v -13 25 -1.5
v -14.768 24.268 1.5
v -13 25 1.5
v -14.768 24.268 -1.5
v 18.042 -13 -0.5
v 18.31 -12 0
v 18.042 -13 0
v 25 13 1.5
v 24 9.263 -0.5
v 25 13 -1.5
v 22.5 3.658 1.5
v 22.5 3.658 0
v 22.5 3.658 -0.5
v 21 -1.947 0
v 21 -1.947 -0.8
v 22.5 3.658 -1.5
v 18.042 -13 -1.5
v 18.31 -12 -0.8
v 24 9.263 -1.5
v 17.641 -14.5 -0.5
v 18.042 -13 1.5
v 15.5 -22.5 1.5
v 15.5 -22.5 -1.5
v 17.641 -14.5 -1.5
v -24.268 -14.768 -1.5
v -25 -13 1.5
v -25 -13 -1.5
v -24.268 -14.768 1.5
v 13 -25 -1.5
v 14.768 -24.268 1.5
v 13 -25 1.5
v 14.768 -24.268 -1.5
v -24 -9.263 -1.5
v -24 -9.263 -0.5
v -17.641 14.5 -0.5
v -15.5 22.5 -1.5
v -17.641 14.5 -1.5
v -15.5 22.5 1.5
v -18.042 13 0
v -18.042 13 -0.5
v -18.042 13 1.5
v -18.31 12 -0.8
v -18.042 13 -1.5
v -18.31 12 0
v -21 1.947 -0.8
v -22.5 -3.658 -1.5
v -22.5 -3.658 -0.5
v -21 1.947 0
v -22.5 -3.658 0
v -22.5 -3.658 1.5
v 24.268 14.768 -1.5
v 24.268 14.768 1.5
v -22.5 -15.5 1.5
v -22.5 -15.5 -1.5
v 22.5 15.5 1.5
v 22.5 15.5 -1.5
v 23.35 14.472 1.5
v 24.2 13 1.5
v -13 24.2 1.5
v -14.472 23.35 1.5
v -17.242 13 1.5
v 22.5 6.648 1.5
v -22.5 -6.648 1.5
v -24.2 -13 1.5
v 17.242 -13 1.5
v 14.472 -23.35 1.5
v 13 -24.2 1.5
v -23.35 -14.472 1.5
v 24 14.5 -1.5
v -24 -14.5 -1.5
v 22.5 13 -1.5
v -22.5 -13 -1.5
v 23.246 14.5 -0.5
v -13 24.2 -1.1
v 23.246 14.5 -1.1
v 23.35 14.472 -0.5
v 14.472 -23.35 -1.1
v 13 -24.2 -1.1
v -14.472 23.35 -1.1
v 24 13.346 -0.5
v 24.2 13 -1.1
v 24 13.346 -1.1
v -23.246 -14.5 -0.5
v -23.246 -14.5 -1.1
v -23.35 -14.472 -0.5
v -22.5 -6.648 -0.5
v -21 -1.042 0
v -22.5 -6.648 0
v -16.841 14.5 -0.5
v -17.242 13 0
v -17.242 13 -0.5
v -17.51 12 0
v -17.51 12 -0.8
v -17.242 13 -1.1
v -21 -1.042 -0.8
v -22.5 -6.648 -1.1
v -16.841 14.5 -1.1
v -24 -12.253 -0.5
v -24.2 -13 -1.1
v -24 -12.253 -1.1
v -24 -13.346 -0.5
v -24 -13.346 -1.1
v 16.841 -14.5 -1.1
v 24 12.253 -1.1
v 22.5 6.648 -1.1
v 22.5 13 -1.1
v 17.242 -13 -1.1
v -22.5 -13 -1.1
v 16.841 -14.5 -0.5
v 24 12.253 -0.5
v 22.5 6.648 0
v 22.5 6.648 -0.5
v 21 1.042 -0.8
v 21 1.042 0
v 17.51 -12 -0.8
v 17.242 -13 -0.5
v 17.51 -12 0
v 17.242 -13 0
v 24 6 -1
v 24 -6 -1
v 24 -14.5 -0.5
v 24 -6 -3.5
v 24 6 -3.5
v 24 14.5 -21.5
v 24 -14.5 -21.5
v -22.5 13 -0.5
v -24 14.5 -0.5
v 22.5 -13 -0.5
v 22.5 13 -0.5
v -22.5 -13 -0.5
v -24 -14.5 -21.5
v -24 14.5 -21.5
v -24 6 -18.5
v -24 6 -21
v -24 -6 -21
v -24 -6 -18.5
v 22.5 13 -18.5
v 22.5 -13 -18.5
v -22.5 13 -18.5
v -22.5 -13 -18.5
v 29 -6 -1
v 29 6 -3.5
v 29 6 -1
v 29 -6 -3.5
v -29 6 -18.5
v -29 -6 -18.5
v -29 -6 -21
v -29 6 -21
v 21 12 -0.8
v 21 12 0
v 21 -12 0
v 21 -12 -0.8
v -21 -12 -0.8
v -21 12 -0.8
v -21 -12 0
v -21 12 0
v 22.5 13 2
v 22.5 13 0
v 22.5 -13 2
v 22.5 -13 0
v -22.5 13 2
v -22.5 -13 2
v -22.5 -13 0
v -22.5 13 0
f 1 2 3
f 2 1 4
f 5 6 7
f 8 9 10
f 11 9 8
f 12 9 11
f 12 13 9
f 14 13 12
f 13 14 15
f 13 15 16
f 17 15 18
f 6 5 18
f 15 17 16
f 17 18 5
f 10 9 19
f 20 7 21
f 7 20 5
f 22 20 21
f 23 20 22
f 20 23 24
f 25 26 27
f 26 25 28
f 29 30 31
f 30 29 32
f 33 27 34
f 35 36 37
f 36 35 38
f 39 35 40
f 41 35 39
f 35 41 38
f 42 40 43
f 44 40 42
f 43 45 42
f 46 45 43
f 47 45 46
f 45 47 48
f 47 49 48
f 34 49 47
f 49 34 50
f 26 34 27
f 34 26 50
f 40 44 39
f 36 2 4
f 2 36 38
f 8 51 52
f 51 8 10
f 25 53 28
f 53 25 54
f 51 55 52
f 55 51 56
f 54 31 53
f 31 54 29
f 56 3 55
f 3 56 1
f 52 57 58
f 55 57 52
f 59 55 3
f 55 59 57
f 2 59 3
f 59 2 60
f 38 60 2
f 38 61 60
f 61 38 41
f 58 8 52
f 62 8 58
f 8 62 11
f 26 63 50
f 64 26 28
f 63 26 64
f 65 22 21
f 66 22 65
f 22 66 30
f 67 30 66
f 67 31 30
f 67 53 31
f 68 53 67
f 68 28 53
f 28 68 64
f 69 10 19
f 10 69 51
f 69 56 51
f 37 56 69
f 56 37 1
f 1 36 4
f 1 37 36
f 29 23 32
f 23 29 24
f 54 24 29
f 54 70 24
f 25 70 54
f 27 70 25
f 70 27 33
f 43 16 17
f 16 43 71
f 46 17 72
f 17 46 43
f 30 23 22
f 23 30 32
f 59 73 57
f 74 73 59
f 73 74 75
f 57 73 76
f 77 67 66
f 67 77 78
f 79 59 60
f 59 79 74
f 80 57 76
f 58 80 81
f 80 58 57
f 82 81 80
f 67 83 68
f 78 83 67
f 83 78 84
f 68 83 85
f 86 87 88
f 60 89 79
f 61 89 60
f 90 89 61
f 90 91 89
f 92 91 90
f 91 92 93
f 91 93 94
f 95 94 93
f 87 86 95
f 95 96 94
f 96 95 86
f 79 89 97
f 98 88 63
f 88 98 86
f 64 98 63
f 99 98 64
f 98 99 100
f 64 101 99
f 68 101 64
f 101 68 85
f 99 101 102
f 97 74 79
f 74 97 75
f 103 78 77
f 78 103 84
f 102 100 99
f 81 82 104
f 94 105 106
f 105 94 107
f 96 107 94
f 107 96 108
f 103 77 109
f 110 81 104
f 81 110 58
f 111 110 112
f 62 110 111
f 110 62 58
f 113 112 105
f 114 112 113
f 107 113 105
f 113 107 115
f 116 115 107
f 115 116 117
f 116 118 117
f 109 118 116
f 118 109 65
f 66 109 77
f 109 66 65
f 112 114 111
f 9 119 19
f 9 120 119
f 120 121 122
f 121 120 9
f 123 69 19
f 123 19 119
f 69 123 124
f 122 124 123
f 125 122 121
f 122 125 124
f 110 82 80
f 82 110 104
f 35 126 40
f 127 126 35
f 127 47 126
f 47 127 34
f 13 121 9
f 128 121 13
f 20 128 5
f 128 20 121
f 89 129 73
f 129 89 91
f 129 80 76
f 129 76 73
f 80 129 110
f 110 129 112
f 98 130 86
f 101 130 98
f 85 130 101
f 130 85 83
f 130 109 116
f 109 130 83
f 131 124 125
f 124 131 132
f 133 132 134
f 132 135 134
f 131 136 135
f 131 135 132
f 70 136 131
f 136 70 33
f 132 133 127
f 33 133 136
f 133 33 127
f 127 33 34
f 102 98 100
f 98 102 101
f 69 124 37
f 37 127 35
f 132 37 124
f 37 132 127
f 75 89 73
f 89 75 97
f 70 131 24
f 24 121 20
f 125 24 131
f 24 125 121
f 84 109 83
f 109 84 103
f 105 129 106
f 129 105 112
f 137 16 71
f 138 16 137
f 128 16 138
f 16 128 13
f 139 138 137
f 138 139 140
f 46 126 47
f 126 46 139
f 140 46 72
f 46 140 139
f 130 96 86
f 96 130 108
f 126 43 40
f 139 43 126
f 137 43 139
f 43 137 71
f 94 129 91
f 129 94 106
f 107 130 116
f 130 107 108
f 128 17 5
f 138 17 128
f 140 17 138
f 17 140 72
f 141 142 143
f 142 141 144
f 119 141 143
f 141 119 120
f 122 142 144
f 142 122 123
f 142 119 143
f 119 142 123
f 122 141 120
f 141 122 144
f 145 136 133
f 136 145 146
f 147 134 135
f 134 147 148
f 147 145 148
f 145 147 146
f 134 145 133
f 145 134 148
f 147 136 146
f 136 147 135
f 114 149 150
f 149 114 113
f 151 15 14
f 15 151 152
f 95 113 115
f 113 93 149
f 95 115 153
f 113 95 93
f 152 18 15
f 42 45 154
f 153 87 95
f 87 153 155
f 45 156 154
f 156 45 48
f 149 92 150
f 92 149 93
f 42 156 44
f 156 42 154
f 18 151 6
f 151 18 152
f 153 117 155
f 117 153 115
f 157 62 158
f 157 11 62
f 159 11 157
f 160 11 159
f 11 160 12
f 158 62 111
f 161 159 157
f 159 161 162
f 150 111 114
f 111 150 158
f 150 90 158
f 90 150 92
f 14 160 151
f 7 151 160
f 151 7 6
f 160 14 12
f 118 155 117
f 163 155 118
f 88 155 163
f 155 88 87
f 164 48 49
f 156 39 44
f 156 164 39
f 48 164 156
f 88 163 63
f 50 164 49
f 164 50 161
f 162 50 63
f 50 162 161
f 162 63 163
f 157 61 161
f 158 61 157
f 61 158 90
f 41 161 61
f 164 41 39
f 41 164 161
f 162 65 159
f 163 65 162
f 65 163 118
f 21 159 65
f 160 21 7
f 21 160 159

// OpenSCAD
// Parameters
overall_x_mm = 48; //[24:96:1]
overall_y_mm = 29; //[15:58:1]
overall_z_mm = 24; //[12:48:1]
bezel_x_mm = 50; //[25:100:1]
bezel_y_mm = 31; //[16:62:1]
bezel_z_mm = 3; //[1.5:8:0.5]
bezel_corner_radius_mm = 2.5; //[0:8:0.5]
bezel_bevel_mm = 0.8; //[0:3:0.1]
body_depth_behind_bezel_mm = 21; //[10:45:1]
body_wall_thickness_mm = 1.5; //[0:4:0.1]
display_aperture_x_mm = 36; //[18:72:1]
display_aperture_y_mm = 18; //[9:36:1]
display_aperture_corner_radius_mm = 1.2; //[0:6:0.2]
panel_cutout_x_mm = 45; //[22:90:1]
panel_cutout_y_mm = 26; //[13:52:1]
panel_reference_thickness_mm = 2; //[1:6:0.5]
tab_enabled = 1; //[0:1:1]
tab_x_mm = 6; //[3:15:0.5]
tab_y_mm = 12; //[6:25:1]
tab_z_mm = 2.5; //[1:6:0.5]
tab_offset_z_mm = 6; //[0:20:1]
pcb_enabled = 1; //[0:1:1]
pcb_x_mm = 42; //[21:84:1]
pcb_y_mm = 24; //[12:48:1]
pcb_z_mm = 1.6; //[0.8:3.2:0.1]
pcb_offset_z_mm = 6; //[0:20:1]
inner_insert_enabled = 1; //[0:1:1]
inner_insert_thickness_mm = 1.2; //[0.6:3:0.1]
inner_insert_border_mm = 2; //[1:6:0.5]
buttons_enabled = 0; //[0:1:1]
button_diameter_mm = 4; //[2:10:0.5]
button_height_mm = 1.5; //[0.8:4:0.1]
button_spacing_x_mm = 7; //[4:20:0.5]
button_row_offset_y_mm = 10; //[5:20:0.5]
overlap_mm = 1; //[0.5:2:0.1]

// Module for Mod
module mod() {
  color([0.0, 0.4, 0.2]) {
    cube([pcb_x_mm, pcb_y_mm, pcb_z_mm], center=true);
  }
}

// Panel meter solid (bezel + body + side tabs) as ONE connected union
module panel_meter() {

  // Key Z references (bezel centered at z=0)
  body_center_z = -(bezel_z_mm/2 + body_depth_behind_bezel_mm/2 - overlap_mm);

  // Body extents in Z
  body_top_z    = body_center_z + body_depth_behind_bezel_mm/2;
  body_bottom_z = body_center_z - body_depth_behind_bezel_mm/2;

  // Tab placement: attach to LEFT and RIGHT sides of the main body,
  // and place one near the top and one near the bottom (as seen in views).
  // Ensure intersection with body by overlapping in X by overlap_mm.
  tab_center_x_right =  overall_x_mm/2 + tab_x_mm/2 - overlap_mm;
  tab_center_x_left  = -overall_x_mm/2 - tab_x_mm/2 + overlap_mm;

  // Put tabs within the body's Z span (not floating), with a small inset from ends.
  tab_center_z_top    = body_top_z    - tab_z_mm/2 - overlap_mm/2;
  tab_center_z_bottom = body_bottom_z + tab_z_mm/2 + overlap_mm/2;

  color("Black") {
    union() {

      // Front Bezel
      difference() {
        hull() {
          for (i = [0:3]) {
            rotate([0, 0, i * 90])
              translate([bezel_x_mm/2 - bezel_corner_radius_mm,
                         bezel_y_mm/2 - bezel_corner_radius_mm, 0])
                cylinder(r=bezel_corner_radius_mm, h=bezel_z_mm, center=true);
          }
        }
        hull() {
          for (i = [0:3]) {
            rotate([0, 0, i * 90])
              translate([bezel_x_mm/2 - bezel_corner_radius_mm,
                         bezel_y_mm/2 - bezel_corner_radius_mm, bezel_bevel_mm/2])
                cylinder(r=max(0, bezel_corner_radius_mm - bezel_bevel_mm),
                         h=bezel_z_mm, center=true);
          }
        }
      }

      // Main Body (behind bezel) - overlaps bezel by overlap_mm
      translate([0, 0, body_center_z])
      difference() {
        cube([overall_x_mm, overall_y_mm, body_depth_behind_bezel_mm], center=true);
        translate([0, 0, body_wall_thickness_mm])
          cube([max(0, overall_x_mm - 2*body_wall_thickness_mm),
                max(0, overall_y_mm - 2*body_wall_thickness_mm),
                max(0, body_depth_behind_bezel_mm - 2*body_wall_thickness_mm)], center=true);
      }

      // Side tabs/connectors (FIX: ensure they intersect the body; no floating parts)
      if (tab_enabled) {

        // Right side, near TOP (matches "right edge in TOP view")
        translate([tab_center_x_right, 0, tab_center_z_top])
          cube([tab_x_mm, tab_y_mm, tab_z_mm], center=true);

        // Left side, near BOTTOM (matches "left edge in BOTTOM view")
        translate([tab_center_x_left, 0, tab_center_z_bottom])
          cube([tab_x_mm, tab_y_mm, tab_z_mm], center=true);
      }
    }
  }
}

// Module for Panel Meter Button
module panel_meter_button() {
  if (buttons_enabled) {
    color("White") {
      translate([-button_spacing_x_mm/2, -button_row_offset_y_mm, bezel_z_mm/2 + button_height_mm/2 - overlap_mm])
        cylinder(r=button_diameter_mm/2, h=button_height_mm, center=true);
      translate([button_spacing_x_mm/2, -button_row_offset_y_mm, bezel_z_mm/2 + button_height_mm/2 - overlap_mm])
        cylinder(r=button_diameter_mm/2, h=button_height_mm, center=true);
    }
  }
}

// Module for Panel Meter Cutout
module panel_meter_cutout() {
  color("Silver") {
    translate([0, 0, bezel_z_mm/2 - panel_reference_thickness_mm/2 + overlap_mm/2])
      cube([panel_cutout_x_mm, panel_cutout_y_mm, panel_reference_thickness_mm], center=true);
  }
}

// Assembly (keep as separate visual parts; panel_meter itself is a single connected union)
module assembly() {
  mod();
  panel_meter();
  panel_meter_button();
  panel_meter_cutout();
}

assembly();
